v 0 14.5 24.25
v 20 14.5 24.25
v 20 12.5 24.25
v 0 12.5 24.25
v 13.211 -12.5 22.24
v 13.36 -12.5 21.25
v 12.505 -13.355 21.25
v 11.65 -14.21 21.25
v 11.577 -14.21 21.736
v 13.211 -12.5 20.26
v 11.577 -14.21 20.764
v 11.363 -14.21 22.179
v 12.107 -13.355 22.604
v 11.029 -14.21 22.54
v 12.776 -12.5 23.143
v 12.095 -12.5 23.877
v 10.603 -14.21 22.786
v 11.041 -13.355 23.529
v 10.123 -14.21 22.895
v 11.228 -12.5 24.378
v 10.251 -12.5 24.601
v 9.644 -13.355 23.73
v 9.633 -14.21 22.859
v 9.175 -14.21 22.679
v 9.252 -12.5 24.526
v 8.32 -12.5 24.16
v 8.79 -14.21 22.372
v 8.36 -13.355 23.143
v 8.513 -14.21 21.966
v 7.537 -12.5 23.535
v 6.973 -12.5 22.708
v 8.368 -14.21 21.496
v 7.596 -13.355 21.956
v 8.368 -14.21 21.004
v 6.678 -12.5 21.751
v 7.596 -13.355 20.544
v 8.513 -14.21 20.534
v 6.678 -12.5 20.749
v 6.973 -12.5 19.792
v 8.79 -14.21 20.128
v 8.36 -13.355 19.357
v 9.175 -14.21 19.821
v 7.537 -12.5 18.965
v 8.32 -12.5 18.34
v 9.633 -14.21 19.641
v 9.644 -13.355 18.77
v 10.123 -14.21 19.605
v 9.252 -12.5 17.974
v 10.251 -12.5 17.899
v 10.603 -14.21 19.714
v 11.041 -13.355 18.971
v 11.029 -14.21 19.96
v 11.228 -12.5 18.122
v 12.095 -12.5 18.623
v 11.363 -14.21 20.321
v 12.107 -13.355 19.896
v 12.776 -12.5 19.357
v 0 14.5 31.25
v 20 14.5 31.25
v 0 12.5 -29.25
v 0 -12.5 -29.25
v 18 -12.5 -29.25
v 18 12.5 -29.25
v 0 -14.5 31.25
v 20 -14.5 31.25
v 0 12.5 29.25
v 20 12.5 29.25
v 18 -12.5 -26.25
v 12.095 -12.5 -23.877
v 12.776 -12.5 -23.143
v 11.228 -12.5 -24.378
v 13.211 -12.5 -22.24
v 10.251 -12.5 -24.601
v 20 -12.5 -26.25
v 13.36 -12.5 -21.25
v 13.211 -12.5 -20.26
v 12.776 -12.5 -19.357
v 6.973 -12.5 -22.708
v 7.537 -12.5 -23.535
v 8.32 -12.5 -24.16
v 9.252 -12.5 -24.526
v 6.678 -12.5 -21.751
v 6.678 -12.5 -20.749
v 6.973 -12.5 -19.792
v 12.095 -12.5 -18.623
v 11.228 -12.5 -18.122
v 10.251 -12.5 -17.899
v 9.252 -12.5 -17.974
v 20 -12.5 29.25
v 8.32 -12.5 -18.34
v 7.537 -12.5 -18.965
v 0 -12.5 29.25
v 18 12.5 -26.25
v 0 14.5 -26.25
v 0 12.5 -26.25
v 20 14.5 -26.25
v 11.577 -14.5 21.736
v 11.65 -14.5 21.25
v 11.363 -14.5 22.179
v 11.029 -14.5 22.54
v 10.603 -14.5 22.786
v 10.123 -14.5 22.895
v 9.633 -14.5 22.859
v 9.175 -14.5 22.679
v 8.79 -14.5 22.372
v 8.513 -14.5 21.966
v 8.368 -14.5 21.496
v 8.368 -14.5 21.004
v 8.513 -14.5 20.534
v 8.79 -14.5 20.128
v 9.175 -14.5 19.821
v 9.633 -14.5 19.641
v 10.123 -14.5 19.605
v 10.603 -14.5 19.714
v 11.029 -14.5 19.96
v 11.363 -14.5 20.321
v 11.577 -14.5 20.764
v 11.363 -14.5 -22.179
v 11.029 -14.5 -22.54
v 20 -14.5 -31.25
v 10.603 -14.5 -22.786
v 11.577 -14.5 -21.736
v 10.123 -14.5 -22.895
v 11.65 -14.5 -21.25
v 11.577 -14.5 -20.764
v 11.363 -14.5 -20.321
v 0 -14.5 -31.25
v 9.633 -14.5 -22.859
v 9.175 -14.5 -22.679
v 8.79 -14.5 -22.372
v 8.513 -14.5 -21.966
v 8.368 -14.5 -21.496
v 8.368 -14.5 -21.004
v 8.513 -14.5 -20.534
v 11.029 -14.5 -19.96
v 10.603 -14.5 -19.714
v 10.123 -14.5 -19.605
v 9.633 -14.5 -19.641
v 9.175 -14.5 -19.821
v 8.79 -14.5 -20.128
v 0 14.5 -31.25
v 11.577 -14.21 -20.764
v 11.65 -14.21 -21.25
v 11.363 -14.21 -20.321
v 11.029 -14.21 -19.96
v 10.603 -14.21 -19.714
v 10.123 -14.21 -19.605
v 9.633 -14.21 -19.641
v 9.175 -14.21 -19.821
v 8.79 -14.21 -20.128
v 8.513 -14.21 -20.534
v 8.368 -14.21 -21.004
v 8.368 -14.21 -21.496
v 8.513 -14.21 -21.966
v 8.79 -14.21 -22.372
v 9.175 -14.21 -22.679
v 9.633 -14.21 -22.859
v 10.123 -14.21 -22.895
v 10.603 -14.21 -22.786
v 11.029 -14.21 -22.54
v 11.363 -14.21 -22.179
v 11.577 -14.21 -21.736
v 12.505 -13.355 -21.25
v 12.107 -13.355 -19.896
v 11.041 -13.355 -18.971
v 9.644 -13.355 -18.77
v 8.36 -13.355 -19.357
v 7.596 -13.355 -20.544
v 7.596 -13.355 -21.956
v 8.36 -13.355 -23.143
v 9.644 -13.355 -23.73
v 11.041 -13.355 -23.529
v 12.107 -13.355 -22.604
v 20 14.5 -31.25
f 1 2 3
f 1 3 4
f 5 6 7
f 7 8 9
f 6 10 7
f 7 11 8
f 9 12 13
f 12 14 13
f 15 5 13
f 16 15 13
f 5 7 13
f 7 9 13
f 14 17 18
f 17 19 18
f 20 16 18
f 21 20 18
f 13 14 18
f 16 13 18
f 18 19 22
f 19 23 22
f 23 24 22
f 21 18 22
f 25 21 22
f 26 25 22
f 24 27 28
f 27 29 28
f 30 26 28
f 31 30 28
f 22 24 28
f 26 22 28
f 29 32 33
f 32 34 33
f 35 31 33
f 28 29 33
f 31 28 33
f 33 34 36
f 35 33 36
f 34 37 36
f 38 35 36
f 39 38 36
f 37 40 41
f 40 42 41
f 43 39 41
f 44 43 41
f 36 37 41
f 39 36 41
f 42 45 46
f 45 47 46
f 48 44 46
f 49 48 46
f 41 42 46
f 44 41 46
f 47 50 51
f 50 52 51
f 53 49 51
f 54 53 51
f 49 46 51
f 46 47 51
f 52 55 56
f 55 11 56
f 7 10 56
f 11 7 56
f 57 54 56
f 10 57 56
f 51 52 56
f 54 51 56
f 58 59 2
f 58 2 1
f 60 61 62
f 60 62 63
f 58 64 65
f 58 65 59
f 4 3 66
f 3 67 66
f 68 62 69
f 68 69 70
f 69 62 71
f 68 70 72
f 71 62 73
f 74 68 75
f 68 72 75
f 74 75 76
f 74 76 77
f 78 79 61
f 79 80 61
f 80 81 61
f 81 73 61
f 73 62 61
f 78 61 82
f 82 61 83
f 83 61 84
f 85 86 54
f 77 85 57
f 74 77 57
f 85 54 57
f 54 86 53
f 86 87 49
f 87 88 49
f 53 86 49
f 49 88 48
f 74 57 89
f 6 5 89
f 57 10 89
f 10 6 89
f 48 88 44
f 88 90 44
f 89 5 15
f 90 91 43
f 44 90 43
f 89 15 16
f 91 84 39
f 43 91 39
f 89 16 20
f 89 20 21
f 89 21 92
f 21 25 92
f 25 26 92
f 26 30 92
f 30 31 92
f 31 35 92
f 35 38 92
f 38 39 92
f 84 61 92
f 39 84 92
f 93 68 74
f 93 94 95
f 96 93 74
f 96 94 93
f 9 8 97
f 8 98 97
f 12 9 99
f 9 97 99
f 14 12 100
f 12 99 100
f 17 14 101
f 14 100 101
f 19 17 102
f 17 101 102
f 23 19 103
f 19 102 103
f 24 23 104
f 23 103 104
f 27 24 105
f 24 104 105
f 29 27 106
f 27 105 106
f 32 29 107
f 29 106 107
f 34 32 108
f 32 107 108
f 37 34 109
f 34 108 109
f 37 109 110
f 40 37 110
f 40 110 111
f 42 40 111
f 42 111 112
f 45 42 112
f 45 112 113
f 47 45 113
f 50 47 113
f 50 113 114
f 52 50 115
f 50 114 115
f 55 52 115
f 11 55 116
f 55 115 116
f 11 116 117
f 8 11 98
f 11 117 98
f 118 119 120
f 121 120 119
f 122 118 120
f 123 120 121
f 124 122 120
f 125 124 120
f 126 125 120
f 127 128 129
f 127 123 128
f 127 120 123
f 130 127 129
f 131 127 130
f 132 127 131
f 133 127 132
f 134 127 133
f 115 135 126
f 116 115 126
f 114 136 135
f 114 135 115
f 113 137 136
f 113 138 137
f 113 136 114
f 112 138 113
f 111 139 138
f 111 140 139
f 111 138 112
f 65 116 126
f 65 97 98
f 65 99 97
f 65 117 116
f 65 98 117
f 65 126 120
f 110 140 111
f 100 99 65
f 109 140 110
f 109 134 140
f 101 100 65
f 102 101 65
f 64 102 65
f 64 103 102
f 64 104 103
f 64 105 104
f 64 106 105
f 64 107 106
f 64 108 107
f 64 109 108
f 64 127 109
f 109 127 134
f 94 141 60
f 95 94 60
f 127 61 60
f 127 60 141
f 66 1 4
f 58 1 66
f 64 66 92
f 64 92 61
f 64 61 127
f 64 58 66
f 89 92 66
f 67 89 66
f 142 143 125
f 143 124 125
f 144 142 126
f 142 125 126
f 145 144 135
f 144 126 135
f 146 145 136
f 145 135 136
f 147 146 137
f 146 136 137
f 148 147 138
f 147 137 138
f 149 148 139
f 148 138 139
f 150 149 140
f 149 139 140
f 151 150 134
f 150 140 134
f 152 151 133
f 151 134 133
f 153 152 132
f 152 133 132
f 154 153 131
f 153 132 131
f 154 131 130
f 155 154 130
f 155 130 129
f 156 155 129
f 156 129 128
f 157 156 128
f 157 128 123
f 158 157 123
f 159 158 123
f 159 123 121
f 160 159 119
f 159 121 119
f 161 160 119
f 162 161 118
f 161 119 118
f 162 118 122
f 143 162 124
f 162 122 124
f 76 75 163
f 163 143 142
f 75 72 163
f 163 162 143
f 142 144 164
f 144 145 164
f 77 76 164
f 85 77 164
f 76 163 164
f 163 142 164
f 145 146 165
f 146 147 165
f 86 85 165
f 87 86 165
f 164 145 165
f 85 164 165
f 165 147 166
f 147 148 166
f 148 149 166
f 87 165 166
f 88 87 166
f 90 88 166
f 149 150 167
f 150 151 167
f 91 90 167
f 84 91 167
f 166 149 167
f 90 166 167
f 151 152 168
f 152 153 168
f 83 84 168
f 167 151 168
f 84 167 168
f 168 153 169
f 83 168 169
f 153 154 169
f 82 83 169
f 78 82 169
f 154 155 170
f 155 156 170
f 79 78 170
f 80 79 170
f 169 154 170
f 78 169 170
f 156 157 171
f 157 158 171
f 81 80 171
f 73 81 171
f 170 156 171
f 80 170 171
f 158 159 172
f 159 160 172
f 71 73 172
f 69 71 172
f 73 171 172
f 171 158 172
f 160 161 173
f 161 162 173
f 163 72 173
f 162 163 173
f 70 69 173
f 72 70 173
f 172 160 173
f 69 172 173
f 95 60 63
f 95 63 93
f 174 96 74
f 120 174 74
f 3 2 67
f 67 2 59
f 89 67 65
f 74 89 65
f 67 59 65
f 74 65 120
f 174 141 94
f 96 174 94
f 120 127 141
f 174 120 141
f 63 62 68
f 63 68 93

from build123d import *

# Parameters (mm, degrees)
F0_W           = 29
F0_H           = 62.5
F0_W_2         = 25
F0_H_2         = 58.5
F1_DEPTH       = 20
F2_W           = 20
F2_H           = 52.5
F3_DEPTH       = 2
F5_D           = 3.3
F5_CSINK_D     = 6.72
F5_CSINK_ANGLE = 90
F6_W           = 2
F6_H           = 25
F7_DEPTH       = 3
F8_DEPTH       = 2


with BuildPart() as f1:
    # F0 (on Right) → F1 (new body)
    with BuildSketch(Plane.YZ):
        Rectangle(F0_W, F0_H)
        Rectangle(F0_W_2, F0_H_2, mode=Mode.SUBTRACT)
    extrude(amount=F1_DEPTH)

    # F2 (on face) → F3 (cut)
    with BuildSketch(Plane(origin=(0, 14.5, 0), x_dir=(-1, 0, 0), z_dir=(0, 1, 0))):
        with Locations((-10, 0)):
            Rectangle(F2_W, F2_H)
    extrude(amount=-F3_DEPTH, mode=Mode.SUBTRACT)

    # F5 (through all)
    with Locations(Plane(origin=(0, -12.5, 0), x_dir=(-1, 0, 0), z_dir=(0, 1, 0))):
        with Locations((-10, 21.25), (-10, -21.25)):
            CounterSinkHole(F5_D / 2, F5_CSINK_D / 2, counter_sink_angle=F5_CSINK_ANGLE)

    # F6 (on face) → F7 (join, through all)
    with BuildSketch(Plane.XY.offset(-29.25)):
        with Locations((19, 0)):
            Rectangle(F6_W, F6_H)
    extrude(amount=F7_DEPTH)

    # F8 (add): a face of the model
    f8_faces = [f1.faces().sort_by_distance(p)[0] for p in [
        (10, 13.5, 26.25),
    ]]
    extrude(f8_faces, amount=F8_DEPTH)


solid = f1.part
